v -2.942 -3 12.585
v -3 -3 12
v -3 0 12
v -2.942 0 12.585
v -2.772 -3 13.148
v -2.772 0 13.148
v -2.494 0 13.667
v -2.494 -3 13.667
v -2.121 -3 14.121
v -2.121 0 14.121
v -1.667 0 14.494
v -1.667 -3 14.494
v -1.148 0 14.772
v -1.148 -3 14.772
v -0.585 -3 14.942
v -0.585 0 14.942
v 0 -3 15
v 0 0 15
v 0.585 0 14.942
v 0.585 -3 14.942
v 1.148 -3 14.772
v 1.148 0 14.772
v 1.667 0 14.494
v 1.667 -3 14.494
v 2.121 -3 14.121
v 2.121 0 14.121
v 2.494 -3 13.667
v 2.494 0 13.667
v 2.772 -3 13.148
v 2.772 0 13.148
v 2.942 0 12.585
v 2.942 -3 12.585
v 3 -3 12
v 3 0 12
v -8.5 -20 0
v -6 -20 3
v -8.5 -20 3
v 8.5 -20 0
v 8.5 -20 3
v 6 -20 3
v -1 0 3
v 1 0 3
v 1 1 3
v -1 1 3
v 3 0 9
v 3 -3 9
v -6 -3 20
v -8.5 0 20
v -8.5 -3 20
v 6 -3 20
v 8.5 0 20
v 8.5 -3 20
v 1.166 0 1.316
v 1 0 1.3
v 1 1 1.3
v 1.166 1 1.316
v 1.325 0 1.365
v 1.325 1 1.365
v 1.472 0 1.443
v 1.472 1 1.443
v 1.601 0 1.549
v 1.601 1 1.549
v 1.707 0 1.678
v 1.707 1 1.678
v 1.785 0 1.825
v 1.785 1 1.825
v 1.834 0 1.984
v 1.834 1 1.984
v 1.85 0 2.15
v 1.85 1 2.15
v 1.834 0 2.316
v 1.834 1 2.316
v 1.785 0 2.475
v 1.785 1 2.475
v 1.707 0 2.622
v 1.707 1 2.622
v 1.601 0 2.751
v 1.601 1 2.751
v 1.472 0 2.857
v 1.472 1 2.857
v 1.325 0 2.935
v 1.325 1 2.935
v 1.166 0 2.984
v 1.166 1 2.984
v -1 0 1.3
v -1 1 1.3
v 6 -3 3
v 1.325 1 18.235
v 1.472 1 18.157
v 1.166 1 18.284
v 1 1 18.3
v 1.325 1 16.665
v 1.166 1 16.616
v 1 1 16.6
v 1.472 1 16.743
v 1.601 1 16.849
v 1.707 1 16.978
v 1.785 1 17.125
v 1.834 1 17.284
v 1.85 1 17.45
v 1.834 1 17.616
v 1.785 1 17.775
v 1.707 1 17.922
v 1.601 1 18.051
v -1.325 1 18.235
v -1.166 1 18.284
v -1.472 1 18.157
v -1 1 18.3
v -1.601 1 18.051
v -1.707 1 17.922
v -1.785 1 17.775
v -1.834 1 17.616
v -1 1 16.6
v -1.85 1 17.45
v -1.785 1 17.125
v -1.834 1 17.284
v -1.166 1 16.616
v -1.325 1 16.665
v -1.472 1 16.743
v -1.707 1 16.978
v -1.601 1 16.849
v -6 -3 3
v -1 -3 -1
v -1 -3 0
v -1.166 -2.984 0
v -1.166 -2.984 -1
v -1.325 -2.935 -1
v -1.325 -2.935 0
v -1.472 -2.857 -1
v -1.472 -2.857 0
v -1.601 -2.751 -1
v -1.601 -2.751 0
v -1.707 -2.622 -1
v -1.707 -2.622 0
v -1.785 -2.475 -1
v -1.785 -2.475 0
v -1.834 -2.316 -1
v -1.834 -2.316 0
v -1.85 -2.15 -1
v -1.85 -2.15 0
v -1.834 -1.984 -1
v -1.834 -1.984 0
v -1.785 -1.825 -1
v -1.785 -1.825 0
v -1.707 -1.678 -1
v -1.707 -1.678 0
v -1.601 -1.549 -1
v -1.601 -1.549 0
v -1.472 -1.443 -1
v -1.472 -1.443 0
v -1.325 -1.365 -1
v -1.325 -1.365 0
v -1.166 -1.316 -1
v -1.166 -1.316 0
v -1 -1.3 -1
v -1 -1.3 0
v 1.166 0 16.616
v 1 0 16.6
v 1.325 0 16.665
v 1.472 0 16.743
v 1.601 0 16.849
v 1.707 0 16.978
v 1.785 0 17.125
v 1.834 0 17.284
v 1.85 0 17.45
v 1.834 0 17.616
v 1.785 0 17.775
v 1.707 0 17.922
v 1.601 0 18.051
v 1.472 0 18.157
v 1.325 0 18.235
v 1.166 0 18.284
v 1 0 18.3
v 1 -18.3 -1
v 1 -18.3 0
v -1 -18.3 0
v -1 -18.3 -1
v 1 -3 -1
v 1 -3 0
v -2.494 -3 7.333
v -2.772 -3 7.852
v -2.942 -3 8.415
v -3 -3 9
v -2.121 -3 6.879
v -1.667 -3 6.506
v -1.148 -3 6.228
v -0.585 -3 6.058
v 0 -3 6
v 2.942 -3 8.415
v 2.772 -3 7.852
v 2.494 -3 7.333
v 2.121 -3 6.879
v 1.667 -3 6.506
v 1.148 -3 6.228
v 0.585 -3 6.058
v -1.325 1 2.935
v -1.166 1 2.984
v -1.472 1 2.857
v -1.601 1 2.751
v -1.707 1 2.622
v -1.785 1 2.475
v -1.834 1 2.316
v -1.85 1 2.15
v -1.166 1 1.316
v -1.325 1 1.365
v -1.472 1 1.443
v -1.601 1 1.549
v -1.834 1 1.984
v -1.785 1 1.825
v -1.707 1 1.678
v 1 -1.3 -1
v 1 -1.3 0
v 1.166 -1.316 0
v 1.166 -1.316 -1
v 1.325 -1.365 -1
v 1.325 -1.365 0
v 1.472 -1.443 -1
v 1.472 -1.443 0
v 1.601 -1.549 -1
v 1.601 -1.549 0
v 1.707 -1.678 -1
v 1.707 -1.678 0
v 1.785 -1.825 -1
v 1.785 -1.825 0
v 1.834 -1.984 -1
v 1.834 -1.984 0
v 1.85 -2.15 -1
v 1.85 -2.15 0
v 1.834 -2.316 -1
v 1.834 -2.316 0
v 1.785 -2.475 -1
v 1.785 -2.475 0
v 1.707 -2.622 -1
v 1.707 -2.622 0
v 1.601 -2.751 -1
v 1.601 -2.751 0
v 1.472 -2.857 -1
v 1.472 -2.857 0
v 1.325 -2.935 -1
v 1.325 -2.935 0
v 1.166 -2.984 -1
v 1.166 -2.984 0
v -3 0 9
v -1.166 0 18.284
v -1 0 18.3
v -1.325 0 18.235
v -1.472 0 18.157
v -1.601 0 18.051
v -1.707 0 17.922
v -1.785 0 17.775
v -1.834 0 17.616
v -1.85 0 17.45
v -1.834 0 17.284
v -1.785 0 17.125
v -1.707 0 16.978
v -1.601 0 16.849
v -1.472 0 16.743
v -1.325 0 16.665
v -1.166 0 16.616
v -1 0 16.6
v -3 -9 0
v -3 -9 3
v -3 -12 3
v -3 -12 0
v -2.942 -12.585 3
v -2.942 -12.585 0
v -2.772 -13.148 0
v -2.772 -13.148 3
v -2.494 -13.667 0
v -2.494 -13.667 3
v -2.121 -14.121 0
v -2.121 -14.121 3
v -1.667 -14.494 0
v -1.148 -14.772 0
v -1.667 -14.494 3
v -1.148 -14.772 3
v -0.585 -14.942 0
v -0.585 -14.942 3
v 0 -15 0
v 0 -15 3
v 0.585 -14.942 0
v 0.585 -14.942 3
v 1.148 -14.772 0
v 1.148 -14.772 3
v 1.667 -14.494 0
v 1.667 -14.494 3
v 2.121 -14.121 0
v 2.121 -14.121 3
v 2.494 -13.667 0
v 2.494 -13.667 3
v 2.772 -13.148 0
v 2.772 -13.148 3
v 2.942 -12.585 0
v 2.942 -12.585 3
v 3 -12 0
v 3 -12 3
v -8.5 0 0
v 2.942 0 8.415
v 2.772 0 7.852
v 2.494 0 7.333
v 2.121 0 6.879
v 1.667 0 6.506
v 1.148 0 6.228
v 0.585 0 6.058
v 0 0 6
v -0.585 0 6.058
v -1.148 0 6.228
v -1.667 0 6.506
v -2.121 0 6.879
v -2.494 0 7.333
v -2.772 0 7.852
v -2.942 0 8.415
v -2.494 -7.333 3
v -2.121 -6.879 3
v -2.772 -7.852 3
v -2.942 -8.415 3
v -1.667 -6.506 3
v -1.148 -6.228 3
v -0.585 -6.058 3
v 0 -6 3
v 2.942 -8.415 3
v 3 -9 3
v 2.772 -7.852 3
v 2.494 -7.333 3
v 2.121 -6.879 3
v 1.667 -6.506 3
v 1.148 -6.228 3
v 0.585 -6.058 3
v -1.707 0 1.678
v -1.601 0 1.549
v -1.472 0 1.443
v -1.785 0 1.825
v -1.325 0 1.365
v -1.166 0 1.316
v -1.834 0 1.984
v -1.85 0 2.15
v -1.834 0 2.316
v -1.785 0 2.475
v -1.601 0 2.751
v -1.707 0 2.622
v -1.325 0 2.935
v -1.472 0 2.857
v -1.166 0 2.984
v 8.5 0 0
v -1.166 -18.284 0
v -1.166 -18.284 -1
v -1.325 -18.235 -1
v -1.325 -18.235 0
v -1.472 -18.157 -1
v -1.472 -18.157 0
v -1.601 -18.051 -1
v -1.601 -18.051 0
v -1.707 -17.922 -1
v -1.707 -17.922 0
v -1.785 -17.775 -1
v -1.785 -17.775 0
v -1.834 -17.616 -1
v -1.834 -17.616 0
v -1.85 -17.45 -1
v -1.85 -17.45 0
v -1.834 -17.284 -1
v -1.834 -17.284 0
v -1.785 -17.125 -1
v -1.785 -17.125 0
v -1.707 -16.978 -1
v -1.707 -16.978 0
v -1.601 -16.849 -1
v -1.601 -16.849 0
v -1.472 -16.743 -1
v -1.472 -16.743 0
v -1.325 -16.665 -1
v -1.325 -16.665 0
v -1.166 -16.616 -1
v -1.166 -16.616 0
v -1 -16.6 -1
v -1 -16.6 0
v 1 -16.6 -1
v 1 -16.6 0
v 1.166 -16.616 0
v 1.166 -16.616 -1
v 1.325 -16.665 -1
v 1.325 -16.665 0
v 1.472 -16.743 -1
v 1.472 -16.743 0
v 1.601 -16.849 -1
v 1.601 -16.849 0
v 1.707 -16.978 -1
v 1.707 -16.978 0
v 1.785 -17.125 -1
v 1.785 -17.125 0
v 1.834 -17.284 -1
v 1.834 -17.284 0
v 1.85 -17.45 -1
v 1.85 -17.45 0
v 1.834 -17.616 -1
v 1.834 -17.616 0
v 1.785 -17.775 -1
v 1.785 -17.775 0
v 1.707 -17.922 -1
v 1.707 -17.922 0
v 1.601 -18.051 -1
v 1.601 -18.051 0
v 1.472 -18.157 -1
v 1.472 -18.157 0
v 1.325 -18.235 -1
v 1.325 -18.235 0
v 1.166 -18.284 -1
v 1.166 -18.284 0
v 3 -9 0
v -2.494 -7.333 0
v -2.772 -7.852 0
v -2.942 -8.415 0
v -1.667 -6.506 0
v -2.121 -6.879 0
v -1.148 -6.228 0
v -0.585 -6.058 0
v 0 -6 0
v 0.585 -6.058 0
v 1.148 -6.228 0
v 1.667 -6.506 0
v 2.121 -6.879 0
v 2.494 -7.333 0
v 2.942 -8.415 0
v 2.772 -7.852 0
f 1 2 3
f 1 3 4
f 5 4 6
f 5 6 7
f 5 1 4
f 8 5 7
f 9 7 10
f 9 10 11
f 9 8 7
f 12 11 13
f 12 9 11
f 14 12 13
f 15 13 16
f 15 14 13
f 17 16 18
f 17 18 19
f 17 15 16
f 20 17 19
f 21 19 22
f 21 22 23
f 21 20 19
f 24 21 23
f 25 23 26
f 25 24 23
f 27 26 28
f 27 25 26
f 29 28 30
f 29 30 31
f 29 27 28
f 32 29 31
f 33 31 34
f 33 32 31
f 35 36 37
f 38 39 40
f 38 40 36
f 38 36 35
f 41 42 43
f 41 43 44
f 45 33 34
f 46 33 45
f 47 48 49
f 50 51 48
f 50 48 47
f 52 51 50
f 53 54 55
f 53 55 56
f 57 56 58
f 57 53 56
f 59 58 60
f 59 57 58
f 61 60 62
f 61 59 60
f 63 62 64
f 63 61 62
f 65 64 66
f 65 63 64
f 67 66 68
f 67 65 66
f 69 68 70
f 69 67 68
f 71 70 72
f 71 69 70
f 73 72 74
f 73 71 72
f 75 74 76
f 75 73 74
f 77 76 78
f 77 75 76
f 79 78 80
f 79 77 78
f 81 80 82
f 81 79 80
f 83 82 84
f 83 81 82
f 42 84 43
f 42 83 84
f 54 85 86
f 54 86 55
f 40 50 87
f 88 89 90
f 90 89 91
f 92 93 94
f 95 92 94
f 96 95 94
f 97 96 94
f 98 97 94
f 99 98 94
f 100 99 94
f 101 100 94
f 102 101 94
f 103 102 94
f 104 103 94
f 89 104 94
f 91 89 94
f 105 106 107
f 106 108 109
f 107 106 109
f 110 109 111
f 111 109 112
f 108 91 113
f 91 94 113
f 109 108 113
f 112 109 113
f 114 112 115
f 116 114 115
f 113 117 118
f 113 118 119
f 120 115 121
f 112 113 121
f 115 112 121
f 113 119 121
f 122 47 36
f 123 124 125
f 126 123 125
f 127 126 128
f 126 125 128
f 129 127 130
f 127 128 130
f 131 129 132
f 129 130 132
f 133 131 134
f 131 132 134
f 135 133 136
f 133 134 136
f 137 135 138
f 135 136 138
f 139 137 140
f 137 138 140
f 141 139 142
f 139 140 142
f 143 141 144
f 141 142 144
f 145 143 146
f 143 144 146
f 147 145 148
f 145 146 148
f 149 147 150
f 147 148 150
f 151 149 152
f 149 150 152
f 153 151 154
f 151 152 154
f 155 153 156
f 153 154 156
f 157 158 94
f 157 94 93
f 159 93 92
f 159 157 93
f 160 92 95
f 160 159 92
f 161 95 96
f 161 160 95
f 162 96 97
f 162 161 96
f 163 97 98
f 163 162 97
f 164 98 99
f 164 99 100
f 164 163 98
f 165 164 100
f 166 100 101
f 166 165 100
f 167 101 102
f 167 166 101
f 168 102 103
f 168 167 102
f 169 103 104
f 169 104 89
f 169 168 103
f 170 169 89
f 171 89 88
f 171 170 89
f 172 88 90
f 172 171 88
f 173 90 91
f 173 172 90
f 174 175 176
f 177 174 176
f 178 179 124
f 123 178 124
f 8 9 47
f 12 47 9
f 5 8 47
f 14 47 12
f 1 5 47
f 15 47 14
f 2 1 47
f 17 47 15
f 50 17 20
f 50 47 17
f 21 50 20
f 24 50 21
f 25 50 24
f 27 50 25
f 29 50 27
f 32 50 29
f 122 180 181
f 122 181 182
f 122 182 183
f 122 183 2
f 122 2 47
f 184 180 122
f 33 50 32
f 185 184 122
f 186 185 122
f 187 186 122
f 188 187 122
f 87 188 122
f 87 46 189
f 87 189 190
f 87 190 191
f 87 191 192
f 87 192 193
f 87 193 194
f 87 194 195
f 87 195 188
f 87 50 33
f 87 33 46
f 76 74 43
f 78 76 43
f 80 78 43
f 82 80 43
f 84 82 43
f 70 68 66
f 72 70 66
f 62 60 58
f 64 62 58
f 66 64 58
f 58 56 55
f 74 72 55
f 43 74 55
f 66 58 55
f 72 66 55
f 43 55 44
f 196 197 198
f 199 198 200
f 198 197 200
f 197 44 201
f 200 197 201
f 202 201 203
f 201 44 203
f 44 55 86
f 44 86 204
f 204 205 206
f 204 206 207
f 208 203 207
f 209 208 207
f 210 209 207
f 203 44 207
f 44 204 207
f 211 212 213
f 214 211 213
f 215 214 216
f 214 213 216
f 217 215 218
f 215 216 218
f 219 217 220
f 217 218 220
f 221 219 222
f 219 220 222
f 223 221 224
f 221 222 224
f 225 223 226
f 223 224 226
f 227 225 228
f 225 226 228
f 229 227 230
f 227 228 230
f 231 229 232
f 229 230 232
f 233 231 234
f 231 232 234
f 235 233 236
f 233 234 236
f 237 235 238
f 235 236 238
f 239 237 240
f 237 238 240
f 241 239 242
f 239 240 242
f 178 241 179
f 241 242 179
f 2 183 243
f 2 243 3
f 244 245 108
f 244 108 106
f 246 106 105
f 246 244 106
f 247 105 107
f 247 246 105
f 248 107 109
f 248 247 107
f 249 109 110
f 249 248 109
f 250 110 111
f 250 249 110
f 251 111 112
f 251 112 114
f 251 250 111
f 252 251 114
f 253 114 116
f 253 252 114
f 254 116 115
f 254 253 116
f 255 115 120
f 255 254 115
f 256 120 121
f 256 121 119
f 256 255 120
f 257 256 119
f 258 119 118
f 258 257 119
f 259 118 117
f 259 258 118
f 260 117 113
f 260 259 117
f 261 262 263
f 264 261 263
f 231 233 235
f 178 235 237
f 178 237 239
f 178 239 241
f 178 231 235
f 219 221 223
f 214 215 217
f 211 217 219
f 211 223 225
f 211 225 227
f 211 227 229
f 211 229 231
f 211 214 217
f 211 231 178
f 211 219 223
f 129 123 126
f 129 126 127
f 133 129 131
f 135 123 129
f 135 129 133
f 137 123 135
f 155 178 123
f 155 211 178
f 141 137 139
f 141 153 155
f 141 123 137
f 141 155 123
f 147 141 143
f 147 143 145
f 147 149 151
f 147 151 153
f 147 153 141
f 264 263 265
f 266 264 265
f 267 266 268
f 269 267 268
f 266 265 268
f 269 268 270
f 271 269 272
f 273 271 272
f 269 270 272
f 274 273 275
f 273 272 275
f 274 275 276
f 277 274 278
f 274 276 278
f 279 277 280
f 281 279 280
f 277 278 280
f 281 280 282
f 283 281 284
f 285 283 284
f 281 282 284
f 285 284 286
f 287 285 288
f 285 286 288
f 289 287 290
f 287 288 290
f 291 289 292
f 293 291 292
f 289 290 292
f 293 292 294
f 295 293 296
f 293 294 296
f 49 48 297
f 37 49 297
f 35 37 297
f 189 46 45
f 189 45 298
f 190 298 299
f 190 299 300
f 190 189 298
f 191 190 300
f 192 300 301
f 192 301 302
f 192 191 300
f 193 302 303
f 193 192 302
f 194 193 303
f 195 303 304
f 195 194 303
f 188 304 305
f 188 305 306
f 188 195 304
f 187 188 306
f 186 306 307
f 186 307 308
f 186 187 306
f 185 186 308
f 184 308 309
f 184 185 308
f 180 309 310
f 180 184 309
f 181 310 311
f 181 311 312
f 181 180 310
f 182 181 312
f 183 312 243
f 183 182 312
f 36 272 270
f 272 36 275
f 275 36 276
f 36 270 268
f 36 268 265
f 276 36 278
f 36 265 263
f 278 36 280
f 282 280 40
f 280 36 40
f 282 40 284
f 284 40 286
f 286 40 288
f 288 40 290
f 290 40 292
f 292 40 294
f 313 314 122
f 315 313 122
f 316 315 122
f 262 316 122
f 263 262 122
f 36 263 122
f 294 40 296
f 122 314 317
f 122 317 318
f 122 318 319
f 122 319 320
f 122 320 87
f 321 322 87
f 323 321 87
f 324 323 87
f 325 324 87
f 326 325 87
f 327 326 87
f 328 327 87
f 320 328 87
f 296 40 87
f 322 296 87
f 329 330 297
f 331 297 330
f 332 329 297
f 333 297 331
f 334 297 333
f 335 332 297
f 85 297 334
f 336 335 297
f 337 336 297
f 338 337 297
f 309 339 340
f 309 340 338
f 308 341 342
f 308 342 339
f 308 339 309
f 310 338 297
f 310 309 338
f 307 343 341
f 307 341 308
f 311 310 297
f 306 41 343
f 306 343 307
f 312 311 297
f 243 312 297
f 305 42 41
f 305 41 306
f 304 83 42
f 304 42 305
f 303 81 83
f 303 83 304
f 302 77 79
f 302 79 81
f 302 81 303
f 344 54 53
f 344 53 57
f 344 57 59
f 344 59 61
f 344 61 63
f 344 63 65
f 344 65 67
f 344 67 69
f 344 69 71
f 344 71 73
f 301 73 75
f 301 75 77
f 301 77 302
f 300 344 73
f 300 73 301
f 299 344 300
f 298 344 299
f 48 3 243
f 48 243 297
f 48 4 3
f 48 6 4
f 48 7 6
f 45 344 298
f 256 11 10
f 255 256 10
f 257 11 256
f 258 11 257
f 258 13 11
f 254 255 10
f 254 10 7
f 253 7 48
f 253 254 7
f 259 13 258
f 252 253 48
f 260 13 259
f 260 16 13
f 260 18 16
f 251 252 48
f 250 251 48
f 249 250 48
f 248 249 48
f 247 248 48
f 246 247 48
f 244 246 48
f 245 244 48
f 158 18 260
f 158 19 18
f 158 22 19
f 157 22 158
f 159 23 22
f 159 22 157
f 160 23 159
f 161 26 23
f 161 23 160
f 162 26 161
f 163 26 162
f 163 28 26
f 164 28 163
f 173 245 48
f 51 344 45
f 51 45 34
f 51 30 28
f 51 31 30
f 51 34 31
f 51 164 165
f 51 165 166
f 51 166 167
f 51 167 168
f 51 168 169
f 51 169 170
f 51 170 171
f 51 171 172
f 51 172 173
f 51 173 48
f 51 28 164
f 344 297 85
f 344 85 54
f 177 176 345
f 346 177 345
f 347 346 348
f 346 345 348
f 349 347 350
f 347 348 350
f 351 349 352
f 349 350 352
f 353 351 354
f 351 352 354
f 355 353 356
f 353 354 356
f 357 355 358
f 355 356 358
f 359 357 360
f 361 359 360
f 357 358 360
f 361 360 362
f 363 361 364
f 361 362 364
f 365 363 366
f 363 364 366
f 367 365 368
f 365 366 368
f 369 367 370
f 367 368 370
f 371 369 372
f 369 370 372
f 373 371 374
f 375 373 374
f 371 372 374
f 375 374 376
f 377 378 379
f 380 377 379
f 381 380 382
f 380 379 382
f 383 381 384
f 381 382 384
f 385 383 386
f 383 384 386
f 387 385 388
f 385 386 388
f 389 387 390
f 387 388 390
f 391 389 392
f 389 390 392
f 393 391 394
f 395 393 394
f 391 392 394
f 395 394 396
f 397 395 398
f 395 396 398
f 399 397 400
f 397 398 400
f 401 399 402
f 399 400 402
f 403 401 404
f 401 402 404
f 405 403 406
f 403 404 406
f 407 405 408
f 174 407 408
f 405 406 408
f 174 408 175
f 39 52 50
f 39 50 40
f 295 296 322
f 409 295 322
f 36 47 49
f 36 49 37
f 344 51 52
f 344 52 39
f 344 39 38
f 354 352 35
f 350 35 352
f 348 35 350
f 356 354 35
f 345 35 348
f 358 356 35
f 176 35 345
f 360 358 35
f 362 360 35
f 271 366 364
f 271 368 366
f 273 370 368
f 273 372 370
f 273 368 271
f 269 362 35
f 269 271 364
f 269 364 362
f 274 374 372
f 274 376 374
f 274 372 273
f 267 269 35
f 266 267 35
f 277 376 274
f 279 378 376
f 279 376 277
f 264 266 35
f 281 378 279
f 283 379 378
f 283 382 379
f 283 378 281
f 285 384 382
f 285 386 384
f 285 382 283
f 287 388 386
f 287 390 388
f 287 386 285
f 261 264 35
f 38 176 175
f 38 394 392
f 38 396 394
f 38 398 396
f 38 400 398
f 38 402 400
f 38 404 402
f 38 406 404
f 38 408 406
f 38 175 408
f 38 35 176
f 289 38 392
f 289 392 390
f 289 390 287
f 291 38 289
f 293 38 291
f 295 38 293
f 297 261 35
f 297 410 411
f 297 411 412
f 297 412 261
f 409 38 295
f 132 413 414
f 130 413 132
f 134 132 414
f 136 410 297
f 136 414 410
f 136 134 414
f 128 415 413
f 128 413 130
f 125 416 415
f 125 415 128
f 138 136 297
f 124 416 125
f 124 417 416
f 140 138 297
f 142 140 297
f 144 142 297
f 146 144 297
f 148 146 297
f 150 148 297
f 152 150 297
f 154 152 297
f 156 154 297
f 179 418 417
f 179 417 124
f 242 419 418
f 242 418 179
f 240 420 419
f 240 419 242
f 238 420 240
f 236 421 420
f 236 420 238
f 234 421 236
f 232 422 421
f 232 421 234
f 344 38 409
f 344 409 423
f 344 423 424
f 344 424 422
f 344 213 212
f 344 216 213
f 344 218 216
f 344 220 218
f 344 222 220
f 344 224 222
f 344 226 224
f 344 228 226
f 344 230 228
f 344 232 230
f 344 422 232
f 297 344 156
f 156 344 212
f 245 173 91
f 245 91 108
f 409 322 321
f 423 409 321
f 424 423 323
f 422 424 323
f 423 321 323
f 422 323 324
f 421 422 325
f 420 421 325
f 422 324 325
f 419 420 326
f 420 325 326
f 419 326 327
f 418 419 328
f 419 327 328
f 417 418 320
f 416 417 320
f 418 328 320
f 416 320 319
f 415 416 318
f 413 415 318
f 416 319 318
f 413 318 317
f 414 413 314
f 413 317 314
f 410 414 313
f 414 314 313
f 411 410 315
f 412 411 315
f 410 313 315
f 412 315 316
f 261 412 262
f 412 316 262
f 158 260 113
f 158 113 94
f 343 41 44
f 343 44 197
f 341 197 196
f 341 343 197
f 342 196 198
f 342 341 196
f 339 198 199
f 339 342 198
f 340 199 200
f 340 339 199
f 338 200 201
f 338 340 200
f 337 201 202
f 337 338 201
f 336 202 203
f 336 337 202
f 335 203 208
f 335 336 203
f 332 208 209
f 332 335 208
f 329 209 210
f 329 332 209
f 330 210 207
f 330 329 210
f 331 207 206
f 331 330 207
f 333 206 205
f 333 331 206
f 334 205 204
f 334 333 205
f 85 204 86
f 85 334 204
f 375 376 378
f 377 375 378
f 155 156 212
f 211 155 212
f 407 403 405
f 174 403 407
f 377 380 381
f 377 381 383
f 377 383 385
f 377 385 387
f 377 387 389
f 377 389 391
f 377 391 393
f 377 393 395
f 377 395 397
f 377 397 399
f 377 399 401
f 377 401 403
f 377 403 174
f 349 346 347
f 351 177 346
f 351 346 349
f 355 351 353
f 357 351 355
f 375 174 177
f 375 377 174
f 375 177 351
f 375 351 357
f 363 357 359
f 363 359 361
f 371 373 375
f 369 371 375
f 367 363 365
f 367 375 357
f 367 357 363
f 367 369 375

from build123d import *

# Parameters (mm, degrees)
BOSS_EXTRUDE1_DEPTH = 8.5
SKETCH2_W           = 17
SKETCH2_H           = 17
CUT_EXTRUDE1_DEPTH  = 6
CUT_EXTRUDE2_DEPTH  = 3
BOSS_EXTRUDE2_DEPTH = 1


with BuildPart() as part:
    # Sketch1 → Boss-Extrude1 (new body, symmetric)
    with BuildSketch(Plane(origin=(0, 0, 0), x_dir=(0, 0, -1), z_dir=(1, 0, 0))):
        Polygon((0, 0), (-20, 0), (-20, -3), (-11.5, -11.5), (-3, -20), (0, -20), align=None)
    extrude(amount=BOSS_EXTRUDE1_DEPTH, both=True)

    # Sketch2 → Cut-Extrude1 (cut, symmetric)
    with BuildSketch(Plane(origin=(0, 0, 0), x_dir=(0, 0, -1), z_dir=(1, 0, 0))):
        with Locations((-11.5, -11.5)):
            Rectangle(SKETCH2_W, SKETCH2_H)
    extrude(amount=CUT_EXTRUDE1_DEPTH, both=True, mode=Mode.SUBTRACT)

    # Sketch3 → Cut-Extrude2 (cut)
    with BuildSketch(Plane.XY.offset(3)):
        with BuildLine():
            Line((-3, -9), (-3, -12))
            ThreePointArc((-3, -12), (0, -15), (3, -12))
            Line((3, -12), (3, -9))
            ThreePointArc((3, -9), (0, -6), (-3, -9))
        make_face()
    cut_extrude2 = extrude(amount=-CUT_EXTRUDE2_DEPTH, mode=Mode.SUBTRACT)

    # Sketch4 → Boss-Extrude2 (add)
    with BuildSketch(Plane(origin=(0, 0, 0), x_dir=(-1, 0, 0), z_dir=(0, 0, -1))):
        with BuildLine():
            Line((-1, -3), (1, -3))
            ThreePointArc((1, -3), (1.85, -2.15), (1, -1.3))
            Line((1, -1.3), (-1, -1.3))
            ThreePointArc((-1, -1.3), (-1.85, -2.15), (-1, -3))
        make_face()
        with BuildLine():
            Line((-1, -18.3), (1, -18.3))
            ThreePointArc((1, -18.3), (1.85, -17.45), (1, -16.6))
            Line((1, -16.6), (-1, -16.6))
            ThreePointArc((-1, -16.6), (-1.85, -17.45), (-1, -18.3))
        make_face()
    boss_extrude2 = extrude(amount=BOSS_EXTRUDE2_DEPTH)

    # Mirror1: Cut-Extrude2, Boss-Extrude2 across plane
    add(cut_extrude2.mirror(Plane(origin=(0, 0, 0), x_dir=(0, -0.707106781, 0.707106781), z_dir=(0, 0.707106781, 0.707106781))), mode=Mode.SUBTRACT)
    add(boss_extrude2.mirror(Plane(origin=(0, 0, 0), x_dir=(0, -0.707106781, 0.707106781), z_dir=(0, 0.707106781, 0.707106781))))


solid = part.part
